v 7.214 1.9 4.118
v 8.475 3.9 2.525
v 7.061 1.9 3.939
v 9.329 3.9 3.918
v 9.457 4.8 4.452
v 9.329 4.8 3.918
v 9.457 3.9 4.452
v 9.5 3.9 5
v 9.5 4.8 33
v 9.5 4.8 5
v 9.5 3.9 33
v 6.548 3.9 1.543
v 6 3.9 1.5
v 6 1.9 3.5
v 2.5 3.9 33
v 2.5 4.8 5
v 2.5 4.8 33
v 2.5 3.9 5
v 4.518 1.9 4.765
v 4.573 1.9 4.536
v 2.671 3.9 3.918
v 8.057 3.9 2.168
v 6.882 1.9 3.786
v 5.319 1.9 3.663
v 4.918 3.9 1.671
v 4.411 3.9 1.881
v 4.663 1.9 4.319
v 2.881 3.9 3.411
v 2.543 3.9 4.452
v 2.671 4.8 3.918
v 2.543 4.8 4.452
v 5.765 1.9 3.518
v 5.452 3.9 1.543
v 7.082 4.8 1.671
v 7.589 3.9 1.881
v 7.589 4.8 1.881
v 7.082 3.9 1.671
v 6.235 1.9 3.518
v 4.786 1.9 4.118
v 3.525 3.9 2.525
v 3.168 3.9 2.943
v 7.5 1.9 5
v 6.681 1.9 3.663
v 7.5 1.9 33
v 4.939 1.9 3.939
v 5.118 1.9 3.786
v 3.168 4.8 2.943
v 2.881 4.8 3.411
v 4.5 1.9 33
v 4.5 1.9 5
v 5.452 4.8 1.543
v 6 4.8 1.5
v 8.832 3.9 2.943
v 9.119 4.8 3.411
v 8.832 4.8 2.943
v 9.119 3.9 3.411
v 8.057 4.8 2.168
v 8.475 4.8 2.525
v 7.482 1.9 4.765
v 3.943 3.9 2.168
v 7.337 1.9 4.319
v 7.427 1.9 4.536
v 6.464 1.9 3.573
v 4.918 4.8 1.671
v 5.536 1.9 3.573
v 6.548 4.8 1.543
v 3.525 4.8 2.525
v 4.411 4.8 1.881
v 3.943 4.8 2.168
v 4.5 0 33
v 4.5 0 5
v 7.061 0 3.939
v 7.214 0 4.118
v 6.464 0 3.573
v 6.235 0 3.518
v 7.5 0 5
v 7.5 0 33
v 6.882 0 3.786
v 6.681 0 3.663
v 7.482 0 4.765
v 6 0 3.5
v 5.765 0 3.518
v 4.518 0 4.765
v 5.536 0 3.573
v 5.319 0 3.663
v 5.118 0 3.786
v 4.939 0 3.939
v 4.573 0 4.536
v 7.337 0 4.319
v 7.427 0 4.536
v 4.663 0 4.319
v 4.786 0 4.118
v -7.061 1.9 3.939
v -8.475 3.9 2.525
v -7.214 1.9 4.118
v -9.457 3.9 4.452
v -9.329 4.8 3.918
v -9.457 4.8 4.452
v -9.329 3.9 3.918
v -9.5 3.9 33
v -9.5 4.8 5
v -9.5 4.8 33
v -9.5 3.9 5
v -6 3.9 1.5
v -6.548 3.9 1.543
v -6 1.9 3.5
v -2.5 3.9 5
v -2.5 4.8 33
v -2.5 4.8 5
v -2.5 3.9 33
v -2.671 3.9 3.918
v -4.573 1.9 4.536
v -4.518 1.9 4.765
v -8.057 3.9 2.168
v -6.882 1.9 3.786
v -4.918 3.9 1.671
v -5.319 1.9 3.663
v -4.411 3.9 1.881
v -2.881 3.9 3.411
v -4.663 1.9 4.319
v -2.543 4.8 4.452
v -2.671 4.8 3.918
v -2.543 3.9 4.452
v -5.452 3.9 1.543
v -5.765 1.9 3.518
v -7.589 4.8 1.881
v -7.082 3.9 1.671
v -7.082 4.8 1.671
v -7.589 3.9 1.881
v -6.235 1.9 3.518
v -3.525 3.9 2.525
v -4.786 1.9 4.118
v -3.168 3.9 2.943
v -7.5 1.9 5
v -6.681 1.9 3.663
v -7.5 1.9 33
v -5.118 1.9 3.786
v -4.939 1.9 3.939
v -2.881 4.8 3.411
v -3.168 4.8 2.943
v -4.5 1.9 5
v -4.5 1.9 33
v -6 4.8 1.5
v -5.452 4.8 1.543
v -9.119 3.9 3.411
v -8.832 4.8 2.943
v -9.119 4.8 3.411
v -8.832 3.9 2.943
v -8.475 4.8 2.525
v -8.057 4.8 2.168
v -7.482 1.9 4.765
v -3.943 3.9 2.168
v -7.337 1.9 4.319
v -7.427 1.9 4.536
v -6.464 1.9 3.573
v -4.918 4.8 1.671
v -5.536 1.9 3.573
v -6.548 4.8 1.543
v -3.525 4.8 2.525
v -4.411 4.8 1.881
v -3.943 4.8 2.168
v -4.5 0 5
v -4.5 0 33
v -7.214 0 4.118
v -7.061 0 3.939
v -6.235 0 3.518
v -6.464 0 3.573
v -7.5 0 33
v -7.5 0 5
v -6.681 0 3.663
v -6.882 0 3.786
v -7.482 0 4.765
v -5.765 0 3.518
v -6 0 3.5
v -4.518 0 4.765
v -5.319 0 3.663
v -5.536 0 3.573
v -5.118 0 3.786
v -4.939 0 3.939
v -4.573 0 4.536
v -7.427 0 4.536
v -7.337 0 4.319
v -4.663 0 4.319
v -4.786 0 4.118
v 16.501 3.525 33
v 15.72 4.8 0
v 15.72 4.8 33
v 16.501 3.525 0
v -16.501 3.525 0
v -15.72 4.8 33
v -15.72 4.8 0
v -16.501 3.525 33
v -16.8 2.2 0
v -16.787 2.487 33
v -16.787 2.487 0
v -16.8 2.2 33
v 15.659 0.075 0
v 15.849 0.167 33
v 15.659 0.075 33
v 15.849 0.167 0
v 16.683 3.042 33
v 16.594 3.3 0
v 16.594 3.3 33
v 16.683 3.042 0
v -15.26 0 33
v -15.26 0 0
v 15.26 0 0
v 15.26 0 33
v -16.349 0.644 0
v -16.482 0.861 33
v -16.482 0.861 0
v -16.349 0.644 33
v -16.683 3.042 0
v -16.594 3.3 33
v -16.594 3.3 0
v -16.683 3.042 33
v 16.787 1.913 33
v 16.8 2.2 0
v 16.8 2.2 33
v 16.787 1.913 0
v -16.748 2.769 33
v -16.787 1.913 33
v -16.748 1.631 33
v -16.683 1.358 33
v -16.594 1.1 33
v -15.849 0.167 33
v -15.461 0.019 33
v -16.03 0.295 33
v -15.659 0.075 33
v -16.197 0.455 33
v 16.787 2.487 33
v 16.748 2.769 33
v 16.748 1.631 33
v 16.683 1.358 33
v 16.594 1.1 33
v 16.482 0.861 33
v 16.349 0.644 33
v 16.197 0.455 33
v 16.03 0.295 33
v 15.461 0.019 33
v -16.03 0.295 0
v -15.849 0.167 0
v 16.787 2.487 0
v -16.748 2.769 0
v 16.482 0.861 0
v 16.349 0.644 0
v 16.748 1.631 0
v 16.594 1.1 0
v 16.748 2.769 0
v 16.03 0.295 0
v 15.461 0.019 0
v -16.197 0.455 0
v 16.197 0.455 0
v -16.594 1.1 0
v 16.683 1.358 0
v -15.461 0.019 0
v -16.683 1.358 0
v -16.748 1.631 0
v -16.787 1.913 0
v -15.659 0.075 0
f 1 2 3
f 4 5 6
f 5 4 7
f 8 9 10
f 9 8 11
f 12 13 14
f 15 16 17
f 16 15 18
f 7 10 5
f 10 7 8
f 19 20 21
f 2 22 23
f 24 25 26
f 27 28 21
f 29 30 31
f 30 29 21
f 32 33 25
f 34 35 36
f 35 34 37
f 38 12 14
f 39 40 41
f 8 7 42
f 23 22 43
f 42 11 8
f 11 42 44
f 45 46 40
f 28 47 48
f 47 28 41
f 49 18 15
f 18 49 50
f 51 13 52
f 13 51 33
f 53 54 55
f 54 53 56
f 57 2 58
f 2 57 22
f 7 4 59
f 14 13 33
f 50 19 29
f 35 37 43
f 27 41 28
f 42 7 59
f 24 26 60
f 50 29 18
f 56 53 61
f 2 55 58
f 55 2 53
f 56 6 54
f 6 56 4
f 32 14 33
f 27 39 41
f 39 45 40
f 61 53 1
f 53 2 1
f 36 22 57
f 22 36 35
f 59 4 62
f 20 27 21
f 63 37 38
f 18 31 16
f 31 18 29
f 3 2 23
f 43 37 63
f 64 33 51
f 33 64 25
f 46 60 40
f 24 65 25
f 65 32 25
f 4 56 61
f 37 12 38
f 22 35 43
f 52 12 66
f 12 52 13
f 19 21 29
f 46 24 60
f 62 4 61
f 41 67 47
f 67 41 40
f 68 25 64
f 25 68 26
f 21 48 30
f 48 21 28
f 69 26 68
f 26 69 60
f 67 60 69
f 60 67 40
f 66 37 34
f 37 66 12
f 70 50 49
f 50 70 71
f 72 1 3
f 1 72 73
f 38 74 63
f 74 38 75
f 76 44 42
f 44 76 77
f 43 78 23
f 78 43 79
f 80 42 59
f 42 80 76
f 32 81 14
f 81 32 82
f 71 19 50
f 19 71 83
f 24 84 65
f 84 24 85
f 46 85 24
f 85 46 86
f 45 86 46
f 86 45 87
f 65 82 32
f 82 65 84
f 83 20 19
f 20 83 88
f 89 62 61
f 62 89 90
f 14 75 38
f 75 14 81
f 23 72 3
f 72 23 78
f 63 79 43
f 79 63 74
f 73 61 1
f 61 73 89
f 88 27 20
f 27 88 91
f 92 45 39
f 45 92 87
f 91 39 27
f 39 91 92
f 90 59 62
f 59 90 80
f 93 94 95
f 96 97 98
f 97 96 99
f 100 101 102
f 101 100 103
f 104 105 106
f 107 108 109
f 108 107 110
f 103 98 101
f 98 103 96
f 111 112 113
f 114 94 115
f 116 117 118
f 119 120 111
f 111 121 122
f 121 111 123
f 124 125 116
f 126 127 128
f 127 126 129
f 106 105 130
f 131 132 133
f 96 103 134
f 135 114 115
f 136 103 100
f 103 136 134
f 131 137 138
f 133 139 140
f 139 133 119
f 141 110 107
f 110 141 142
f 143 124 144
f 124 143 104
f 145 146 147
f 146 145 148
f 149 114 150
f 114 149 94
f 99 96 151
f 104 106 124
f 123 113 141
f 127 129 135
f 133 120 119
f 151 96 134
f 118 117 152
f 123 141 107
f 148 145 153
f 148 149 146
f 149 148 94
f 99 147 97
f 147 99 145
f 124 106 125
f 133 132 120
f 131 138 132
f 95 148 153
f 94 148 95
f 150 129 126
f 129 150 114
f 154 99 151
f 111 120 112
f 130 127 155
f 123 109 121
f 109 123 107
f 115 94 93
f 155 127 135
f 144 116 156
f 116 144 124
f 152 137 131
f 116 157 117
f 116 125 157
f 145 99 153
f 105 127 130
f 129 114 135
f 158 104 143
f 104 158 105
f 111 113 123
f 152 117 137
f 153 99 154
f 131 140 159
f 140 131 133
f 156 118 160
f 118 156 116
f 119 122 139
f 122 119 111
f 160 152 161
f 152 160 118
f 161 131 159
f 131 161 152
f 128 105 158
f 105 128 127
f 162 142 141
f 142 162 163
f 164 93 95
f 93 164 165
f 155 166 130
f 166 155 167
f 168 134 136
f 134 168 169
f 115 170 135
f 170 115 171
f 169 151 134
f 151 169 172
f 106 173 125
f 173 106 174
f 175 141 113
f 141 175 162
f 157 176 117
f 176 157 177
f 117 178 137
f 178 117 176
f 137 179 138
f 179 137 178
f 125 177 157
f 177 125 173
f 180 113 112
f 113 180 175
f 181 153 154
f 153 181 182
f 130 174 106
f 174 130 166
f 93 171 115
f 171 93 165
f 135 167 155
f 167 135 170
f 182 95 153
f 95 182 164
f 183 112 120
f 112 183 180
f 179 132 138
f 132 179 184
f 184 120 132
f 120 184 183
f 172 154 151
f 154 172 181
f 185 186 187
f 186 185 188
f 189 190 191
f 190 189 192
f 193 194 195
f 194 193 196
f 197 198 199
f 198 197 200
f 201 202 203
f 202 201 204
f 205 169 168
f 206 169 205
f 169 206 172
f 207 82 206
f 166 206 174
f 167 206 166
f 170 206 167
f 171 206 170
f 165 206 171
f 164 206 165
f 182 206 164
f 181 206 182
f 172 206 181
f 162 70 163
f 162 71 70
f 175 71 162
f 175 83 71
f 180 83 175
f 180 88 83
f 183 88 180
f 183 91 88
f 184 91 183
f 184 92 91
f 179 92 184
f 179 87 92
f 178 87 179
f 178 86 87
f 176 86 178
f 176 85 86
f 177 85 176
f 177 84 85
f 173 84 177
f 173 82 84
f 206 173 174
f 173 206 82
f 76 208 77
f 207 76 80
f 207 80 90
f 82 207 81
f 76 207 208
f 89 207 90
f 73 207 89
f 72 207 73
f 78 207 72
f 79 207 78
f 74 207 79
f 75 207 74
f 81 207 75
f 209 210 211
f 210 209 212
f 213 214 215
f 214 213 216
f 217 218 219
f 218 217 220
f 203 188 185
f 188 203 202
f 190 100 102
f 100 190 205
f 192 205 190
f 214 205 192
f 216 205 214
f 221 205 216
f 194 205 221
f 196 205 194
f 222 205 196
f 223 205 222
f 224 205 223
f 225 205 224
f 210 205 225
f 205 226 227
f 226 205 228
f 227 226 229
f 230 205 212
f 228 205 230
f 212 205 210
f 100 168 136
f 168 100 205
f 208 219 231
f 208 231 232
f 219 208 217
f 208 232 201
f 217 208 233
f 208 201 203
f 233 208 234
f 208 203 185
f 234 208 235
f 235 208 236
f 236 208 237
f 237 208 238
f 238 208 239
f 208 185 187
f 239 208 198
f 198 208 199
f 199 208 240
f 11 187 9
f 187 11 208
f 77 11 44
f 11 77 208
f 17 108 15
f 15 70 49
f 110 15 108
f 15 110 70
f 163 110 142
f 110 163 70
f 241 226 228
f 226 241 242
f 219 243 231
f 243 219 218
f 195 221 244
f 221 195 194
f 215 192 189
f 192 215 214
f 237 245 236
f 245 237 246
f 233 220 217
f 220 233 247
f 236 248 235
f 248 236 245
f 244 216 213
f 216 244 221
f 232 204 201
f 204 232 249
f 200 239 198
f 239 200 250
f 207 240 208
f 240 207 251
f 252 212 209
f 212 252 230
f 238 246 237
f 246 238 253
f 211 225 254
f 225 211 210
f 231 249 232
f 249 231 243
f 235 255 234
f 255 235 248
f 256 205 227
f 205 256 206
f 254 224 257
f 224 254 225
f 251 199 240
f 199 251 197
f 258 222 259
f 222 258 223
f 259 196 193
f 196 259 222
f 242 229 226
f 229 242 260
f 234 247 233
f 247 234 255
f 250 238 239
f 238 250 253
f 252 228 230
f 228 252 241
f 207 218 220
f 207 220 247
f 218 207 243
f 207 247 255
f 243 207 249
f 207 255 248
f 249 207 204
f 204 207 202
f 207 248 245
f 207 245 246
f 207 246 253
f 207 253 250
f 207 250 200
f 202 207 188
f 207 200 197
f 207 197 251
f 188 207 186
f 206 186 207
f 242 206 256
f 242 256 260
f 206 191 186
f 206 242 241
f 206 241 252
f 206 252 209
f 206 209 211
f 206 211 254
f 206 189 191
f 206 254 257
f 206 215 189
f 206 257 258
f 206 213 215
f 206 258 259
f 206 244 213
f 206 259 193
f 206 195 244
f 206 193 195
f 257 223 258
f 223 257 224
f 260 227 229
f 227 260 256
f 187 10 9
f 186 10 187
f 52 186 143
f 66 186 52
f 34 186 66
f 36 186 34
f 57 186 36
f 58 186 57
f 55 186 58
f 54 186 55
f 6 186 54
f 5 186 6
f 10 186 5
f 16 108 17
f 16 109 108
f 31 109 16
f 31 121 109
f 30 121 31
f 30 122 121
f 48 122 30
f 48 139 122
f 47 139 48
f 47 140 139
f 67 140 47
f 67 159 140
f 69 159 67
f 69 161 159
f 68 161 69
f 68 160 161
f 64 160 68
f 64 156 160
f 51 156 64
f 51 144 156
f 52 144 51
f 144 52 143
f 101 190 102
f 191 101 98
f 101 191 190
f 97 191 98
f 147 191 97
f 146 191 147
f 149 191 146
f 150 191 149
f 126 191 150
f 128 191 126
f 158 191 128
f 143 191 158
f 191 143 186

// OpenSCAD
// file: line_roller_anchor.scad
include <lib/parameters.scad>
use <lib/util.scad>

module screw_track(l){
  head_r = 3.5;
  screw_r = 1.5;
  $fn=40;
  module screw_head(){
    translate([0,0,Screw_h])
      cylinder(r1=screw_r, r2=head_r, h=Screw_head_h);
    translate([0,0,Screw_h+Screw_head_h])
      cylinder(r=head_r, h=1);
  }
  hull(){
    screw_head();
    translate([l,0,0])
      screw_head();
  }
  hull(){
    cylinder(r=screw_r, h=Screw_h+1);
    translate([l,0,0])
      cylinder(r=screw_r, h=Screw_h+1);
  }
}

module side_rounders(ydepth){
  for(k=[0,1])
    mirror([k,0,0])
      translate([101,1,57])
      rotate([90,0,0])
      cylinder(r=100, h=ydepth+3, $fn=200);
}

module screw_holes(s){
  translate([0,Front_bearing_x-Back_bearing_x-9,Lower_bearing_z])
    rotate([0,90,0]){
    cylinder(d=3.3, h=49, center=true, $fn=12);
    for(k=[0,1])
      mirror([0,0,k])
        translate([0,0,s/2+3])
        nut(20);
  }
  translate([0,Back_bearing_x-Back_bearing_x-9,Higher_bearing_z])
    rotate([0,90,0]){
    cylinder(d=3.3, h=49, center=true, $fn=12);
    for(k=[0,1])
      mirror([0,0,k])
        translate([0,0,s/2+2])
        nut(20);
  }
  // thread hole
  translate([0,Front_bearing_x-Back_bearing_x-9-1,Higher_bearing_z-3])
    rotate([0,90,0])
    cylinder(d=2, h=49, center=true, $fn=12);
}

rotate([-90,0,0])
new_line_roller_anchor();
module new_line_roller_anchor(){
  s = b623_width + 0.8;
  tower_h = Higher_bearing_z + b623_vgroove_big_r;
  ydepth = b623_vgroove_big_r*4+9;
  difference(){
    scale([0.7, 1,1])
      rotate([90,0,0])
      rounded_eqtri(48, ydepth, 2.2, $fn=12*4);
    for(k=[0,1])
      mirror([k,0,0])
        translate([6,-5,-0.1])
        rotate([0,0,-90])
        screw_track(100);
    translate([-s/2, -ydepth-1, 10])
      cube([s, ydepth+2, 50]);
    translate([0,1,6.5])
      scale([0.45, 0.45/0.7, 0.44/0.7])
        rotate([90,0,0])
        rounded_eqtri(44, ydepth+20, 3, $fn=12*4);
    translate([-5, -ydepth-1, Higher_bearing_z+5.5])
      cube([10, ydepth+2, 7]);
    side_rounders(ydepth);
    screw_holes(s);
  }
  difference(){
    union(){
      for(k=[0,1])
        mirror([k,0,0]){
          translate([s/2-0.4,Back_bearing_x-Back_bearing_x-9, Higher_bearing_z])
          rotate([0,90,0])
            cylinder(d=5.5, h=2, $fn=12*5);
          translate([s/2-0.4,Front_bearing_x-Back_bearing_x-9, Lower_bearing_z])
          rotate([0,90,0])
            cylinder(d=5.5, h=2, $fn=12*5);
        }
      translate([-(b623_width+5)/2, -5-ydepth/2+1, Higher_bearing_z+0.5])
        cube([b623_width+5, 5, 5]);
      translate([0,-Back_bearing_x-9, 0]){
        translate([0,Back_bearing_x, 0])
          rotate([0,0,90])
          preventor_edges(Higher_bearing_z+Depth_of_roller_base/2,
              s, false, -79, 68, back1=4, back2=2.7);
        translate([0,Front_bearing_x, 0])
          rotate([0,0,90])
          preventor_edges(Lower_bearing_z+Depth_of_roller_base/2,
              s, false, -17, 100);
        the_r = b623_vgroove_small_r+2.5;
        translate([0,1.5,0])
          for(k=[0,1])
            mirror([k,0,0])
              translate([s/2,Front_bearing_x, Lower_bearing_z])
              rotate([0,90,0]){
                cylinder(r=the_r, h=2, $fn=12*5);
                rotate([0,0,-45])
                  translate([-the_r,0,0])
                  cube([2*(the_r),20, 2]);
              }
        the_r2 = b623_vgroove_small_r+3.7;
      }
    }
    translate([-50,0,0])
      cube(100);
    translate([-5, -ydepth-1, Higher_bearing_z+5.5])
      cube([10, ydepth+2, 7]);
    translate([-5, -ydepth-1, -50])
      cube([10, ydepth+2, 56]);
    side_rounders(ydepth);
    screw_holes(s);
  }
  scale([1.2,1,1])
  translate([0,-Back_bearing_x-9, 0])
    translate([0, Front_bearing_x, Higher_bearing_z])
    difference(){
      rotate([0,90,0])
        b623_vgroove();
      translate([0,0,-4])
      rotate([90,0,0])
        difference(){
          cylinder(d=5.6, h=7, $fn=24);
          translate([0,0,-1])
            cylinder(d=3.2, h=9, $fn=25);
        }
    }
}

//translate([0,-Back_bearing_x-9, 0])
//the_bearings();
module the_bearings(){
  translate([0, Front_bearing_x, Lower_bearing_z])
    rotate([0,90,0])
    b623_vgroove();
  translate([0, Back_bearing_x, Higher_bearing_z])
    rotate([0,90,0])
    b623_vgroove();
  translate([0, Front_bearing_x, Higher_bearing_z])
    rotate([0,90,0])
    color("white")
    b623_vgroove();
}
// file: lib/parameters.scad
// Parameters shared between modules
Base_th = 2;
Beam_width = 15;
Wiggle = 0.25;
Fat_beam_width = Beam_width + Wiggle;
Beam_length = 400;
Wall_th = 2.5;
Min_beam_width = 12.5;
Max_beam_width = 17.5;
Zip_th = 2;
Zip_h = Zip_th + Max_beam_width - Min_beam_width;
Zip_w = 5.0;
Nema17_cube_width          = 42.43;
Nema17_screw_hole_width    = 43.74; // Opposite corner screws
Nema17_ring_diameter       = 22;
Nema17_cube_height         = 39.36;
Nema17_shaft_height        = 63.65;
Nema17_ring_height         = 2;
Nema17_shaft_radius        = 5/2;
b608_outer_dia = 22.2;
b608_width = 7.05;
b608_bore_r = 4;
Gap_between_sandwich_and_plate = 1.5 + Base_th; // 1.5 mm for wiggle
Motor_bracket_flerp_r = 6;
Motor_bracket_flerp = 14;
Motor_bracket_cw = Nema17_cube_width + 6;
Motor_bracket_att_ang = 50;
Mounting_screw_d = 3.5;
Mounting_screw_head_d = 14;
Spool_outer_wall_th = 4;

// Corner clamp parameters
Cc_l1 = (Fat_beam_width+2*Wall_th)*2*sqrt(3);
Cc_rad_b = 4;
Cc_action_point_from_mid = Cc_l1/sqrt(3)-2*Cc_rad_b-7;  // 5 chosen arbitrarily
Cc_plastic_length = sqrt(Cc_action_point_from_mid*Cc_action_point_from_mid
                       - (Cc_action_point_from_mid/2)*(Cc_action_point_from_mid/2));

// The distance between the two action points on the mover
Sidelength = Beam_length + 2*Cc_plastic_length;

/////// Gear parameters ////////////
Circular_pitch = 262;
Motor_teeth = 10;
Gear_height = 21.4-3;
Motor_pitch                      = (Motor_teeth*Circular_pitch/360);
Motor_pitch_diametrial           = Motor_teeth/(2*Motor_pitch);
Motor_outer_radius               = Motor_pitch + 1/Motor_pitch_diametrial;
Spool_teeth = 100;
Spool_r = 75;
Spool_height = 8;
Spool_pitch                      = (Spool_teeth*Circular_pitch/360);
Spool_pitch_diametrial           = Spool_teeth/(2*Spool_pitch);
Spool_outer_radius               = Spool_pitch + 1/Spool_pitch_diametrial;
Sep_disc_radius = 161.83/2; // Made to match 255 teeth gt2 pulley
Motor_bracket_depth = Gear_height+1+7+Nema17_ring_height+1+Gap_between_sandwich_and_plate;
Spool_core_flerp0 = 16+3;

/////// Lineroller parameters ////////////
b623_width  = 4;
b623_bore_r = 3/2;
b623_vgroove_big_r = 12/2;
b623_vgroove_small_r = 10/2;
b623_outer_dia = 10;

Depth_of_roller_base = 18;
Roller_flerp = 6;
Roller_l = 42;
Roller_fl = (Roller_l - Depth_of_roller_base)/2;

Line_roller_wall_th = 5;

Line_roller_ABC_winch_h =  Gap_between_sandwich_and_plate
                           + Sep_disc_radius
                           - Spool_r
                           + Depth_of_roller_base/2
                           + b623_vgroove_small_r;


Ptfe_r = 2.1;
Roller_base_r = 8;
Screw_h = 2;
Screw_head_h = 2;
M3_screw_head_d = 5.8;
Spool_center_bearing_wall_th = 5;
Corner_clamp_bearings_center_to_center = 15;
Anchor_bearings_center_to_center = Corner_clamp_bearings_center_to_center + b623_outer_dia;

//// Lineroller anchor parameters /////

Back_bearing_x = b623_vgroove_big_r + 1.5;
Front_bearing_x = -b623_vgroove_big_r - 5;
Move_tower = -12.2;
Lower_bearing_z = 13;
Higher_bearing_z = Lower_bearing_z + Corner_clamp_bearings_center_to_center;

//// Cable Clamp parameters /////
Bit_width = 12;
Cable_r=2.5;


//// Donkey and encoder parameters /////

Donkey_shaft_d = 6;
Donkey_h = 65.12;
Donkey_body_d = 50;
Donkey_feet_th = 3.5;

Encoder_LDP3806_shaft_d = 6;
Encoder_LDP3806_d = 38;

// Belt drive parameters
GT2_belt_width = 6.5;
GT2_gear_height = GT2_belt_width + 2;
GT2_motor_gear_height = 16;
GT2_motor_gear_outer_dia = 16;
GT2_spool_gear_teeth = 255;
GT2_motor_gear_teeth = 20;
Torx_depth = GT2_gear_height/2;
Belt_roller_h = 56;
Belt_thickness = 1.4;

Belt_roller_space_between_walls = 2*b623_width + 0.8;
Belt_roller_wall_th = (Depth_of_roller_base - Belt_roller_space_between_walls)/2+2;
Belt_roller_top_adj_screw_x = Depth_of_roller_base/2-3.7;
Belt_roller_top_adj_screw_y = Belt_roller_space_between_walls/2+2;
Belt_roller_containing_cube_ywidth = Belt_roller_space_between_walls+8.5;
Belt_roller_insert_h = 18;



// Spacer parameters
Sandwich_ABC_width = 2*(1+Spool_height) + GT2_gear_height;
Sandwich_D_width = 3*(1+Spool_height) + GT2_gear_height;

Spacer_ABC_width = Sandwich_ABC_width - 2*b608_width;
Spacer_D_width = Sandwich_D_width -2*b608_width;


spd = Spool_height+GT2_gear_height;
// Horizontal_deflector_cube_y_size must be exact this number
// because we want to deflect AB-lines
// 60 degrees on the ceiling unit, and we want to put two
// deflectors in a row and get a distance between bearings
// that maintain the distance d when deflecting 60 degrees
Horizontal_deflector_cube_y_size = (2/sqrt(3))*spd;


// Top plate parameters needed for layout slicer
Yshift_top_plate = -297.8;
// main file
include <lib/parameters.scad>
use <lib/util.scad>
use <line_roller_anchor.scad>

rotate([-90,0,0])
difference(){
  //line_roller_anchor();
  new_line_roller_anchor();
  translate([-50,-50,1+Screw_h+Screw_head_h-0.2])
    cube(100);
}
